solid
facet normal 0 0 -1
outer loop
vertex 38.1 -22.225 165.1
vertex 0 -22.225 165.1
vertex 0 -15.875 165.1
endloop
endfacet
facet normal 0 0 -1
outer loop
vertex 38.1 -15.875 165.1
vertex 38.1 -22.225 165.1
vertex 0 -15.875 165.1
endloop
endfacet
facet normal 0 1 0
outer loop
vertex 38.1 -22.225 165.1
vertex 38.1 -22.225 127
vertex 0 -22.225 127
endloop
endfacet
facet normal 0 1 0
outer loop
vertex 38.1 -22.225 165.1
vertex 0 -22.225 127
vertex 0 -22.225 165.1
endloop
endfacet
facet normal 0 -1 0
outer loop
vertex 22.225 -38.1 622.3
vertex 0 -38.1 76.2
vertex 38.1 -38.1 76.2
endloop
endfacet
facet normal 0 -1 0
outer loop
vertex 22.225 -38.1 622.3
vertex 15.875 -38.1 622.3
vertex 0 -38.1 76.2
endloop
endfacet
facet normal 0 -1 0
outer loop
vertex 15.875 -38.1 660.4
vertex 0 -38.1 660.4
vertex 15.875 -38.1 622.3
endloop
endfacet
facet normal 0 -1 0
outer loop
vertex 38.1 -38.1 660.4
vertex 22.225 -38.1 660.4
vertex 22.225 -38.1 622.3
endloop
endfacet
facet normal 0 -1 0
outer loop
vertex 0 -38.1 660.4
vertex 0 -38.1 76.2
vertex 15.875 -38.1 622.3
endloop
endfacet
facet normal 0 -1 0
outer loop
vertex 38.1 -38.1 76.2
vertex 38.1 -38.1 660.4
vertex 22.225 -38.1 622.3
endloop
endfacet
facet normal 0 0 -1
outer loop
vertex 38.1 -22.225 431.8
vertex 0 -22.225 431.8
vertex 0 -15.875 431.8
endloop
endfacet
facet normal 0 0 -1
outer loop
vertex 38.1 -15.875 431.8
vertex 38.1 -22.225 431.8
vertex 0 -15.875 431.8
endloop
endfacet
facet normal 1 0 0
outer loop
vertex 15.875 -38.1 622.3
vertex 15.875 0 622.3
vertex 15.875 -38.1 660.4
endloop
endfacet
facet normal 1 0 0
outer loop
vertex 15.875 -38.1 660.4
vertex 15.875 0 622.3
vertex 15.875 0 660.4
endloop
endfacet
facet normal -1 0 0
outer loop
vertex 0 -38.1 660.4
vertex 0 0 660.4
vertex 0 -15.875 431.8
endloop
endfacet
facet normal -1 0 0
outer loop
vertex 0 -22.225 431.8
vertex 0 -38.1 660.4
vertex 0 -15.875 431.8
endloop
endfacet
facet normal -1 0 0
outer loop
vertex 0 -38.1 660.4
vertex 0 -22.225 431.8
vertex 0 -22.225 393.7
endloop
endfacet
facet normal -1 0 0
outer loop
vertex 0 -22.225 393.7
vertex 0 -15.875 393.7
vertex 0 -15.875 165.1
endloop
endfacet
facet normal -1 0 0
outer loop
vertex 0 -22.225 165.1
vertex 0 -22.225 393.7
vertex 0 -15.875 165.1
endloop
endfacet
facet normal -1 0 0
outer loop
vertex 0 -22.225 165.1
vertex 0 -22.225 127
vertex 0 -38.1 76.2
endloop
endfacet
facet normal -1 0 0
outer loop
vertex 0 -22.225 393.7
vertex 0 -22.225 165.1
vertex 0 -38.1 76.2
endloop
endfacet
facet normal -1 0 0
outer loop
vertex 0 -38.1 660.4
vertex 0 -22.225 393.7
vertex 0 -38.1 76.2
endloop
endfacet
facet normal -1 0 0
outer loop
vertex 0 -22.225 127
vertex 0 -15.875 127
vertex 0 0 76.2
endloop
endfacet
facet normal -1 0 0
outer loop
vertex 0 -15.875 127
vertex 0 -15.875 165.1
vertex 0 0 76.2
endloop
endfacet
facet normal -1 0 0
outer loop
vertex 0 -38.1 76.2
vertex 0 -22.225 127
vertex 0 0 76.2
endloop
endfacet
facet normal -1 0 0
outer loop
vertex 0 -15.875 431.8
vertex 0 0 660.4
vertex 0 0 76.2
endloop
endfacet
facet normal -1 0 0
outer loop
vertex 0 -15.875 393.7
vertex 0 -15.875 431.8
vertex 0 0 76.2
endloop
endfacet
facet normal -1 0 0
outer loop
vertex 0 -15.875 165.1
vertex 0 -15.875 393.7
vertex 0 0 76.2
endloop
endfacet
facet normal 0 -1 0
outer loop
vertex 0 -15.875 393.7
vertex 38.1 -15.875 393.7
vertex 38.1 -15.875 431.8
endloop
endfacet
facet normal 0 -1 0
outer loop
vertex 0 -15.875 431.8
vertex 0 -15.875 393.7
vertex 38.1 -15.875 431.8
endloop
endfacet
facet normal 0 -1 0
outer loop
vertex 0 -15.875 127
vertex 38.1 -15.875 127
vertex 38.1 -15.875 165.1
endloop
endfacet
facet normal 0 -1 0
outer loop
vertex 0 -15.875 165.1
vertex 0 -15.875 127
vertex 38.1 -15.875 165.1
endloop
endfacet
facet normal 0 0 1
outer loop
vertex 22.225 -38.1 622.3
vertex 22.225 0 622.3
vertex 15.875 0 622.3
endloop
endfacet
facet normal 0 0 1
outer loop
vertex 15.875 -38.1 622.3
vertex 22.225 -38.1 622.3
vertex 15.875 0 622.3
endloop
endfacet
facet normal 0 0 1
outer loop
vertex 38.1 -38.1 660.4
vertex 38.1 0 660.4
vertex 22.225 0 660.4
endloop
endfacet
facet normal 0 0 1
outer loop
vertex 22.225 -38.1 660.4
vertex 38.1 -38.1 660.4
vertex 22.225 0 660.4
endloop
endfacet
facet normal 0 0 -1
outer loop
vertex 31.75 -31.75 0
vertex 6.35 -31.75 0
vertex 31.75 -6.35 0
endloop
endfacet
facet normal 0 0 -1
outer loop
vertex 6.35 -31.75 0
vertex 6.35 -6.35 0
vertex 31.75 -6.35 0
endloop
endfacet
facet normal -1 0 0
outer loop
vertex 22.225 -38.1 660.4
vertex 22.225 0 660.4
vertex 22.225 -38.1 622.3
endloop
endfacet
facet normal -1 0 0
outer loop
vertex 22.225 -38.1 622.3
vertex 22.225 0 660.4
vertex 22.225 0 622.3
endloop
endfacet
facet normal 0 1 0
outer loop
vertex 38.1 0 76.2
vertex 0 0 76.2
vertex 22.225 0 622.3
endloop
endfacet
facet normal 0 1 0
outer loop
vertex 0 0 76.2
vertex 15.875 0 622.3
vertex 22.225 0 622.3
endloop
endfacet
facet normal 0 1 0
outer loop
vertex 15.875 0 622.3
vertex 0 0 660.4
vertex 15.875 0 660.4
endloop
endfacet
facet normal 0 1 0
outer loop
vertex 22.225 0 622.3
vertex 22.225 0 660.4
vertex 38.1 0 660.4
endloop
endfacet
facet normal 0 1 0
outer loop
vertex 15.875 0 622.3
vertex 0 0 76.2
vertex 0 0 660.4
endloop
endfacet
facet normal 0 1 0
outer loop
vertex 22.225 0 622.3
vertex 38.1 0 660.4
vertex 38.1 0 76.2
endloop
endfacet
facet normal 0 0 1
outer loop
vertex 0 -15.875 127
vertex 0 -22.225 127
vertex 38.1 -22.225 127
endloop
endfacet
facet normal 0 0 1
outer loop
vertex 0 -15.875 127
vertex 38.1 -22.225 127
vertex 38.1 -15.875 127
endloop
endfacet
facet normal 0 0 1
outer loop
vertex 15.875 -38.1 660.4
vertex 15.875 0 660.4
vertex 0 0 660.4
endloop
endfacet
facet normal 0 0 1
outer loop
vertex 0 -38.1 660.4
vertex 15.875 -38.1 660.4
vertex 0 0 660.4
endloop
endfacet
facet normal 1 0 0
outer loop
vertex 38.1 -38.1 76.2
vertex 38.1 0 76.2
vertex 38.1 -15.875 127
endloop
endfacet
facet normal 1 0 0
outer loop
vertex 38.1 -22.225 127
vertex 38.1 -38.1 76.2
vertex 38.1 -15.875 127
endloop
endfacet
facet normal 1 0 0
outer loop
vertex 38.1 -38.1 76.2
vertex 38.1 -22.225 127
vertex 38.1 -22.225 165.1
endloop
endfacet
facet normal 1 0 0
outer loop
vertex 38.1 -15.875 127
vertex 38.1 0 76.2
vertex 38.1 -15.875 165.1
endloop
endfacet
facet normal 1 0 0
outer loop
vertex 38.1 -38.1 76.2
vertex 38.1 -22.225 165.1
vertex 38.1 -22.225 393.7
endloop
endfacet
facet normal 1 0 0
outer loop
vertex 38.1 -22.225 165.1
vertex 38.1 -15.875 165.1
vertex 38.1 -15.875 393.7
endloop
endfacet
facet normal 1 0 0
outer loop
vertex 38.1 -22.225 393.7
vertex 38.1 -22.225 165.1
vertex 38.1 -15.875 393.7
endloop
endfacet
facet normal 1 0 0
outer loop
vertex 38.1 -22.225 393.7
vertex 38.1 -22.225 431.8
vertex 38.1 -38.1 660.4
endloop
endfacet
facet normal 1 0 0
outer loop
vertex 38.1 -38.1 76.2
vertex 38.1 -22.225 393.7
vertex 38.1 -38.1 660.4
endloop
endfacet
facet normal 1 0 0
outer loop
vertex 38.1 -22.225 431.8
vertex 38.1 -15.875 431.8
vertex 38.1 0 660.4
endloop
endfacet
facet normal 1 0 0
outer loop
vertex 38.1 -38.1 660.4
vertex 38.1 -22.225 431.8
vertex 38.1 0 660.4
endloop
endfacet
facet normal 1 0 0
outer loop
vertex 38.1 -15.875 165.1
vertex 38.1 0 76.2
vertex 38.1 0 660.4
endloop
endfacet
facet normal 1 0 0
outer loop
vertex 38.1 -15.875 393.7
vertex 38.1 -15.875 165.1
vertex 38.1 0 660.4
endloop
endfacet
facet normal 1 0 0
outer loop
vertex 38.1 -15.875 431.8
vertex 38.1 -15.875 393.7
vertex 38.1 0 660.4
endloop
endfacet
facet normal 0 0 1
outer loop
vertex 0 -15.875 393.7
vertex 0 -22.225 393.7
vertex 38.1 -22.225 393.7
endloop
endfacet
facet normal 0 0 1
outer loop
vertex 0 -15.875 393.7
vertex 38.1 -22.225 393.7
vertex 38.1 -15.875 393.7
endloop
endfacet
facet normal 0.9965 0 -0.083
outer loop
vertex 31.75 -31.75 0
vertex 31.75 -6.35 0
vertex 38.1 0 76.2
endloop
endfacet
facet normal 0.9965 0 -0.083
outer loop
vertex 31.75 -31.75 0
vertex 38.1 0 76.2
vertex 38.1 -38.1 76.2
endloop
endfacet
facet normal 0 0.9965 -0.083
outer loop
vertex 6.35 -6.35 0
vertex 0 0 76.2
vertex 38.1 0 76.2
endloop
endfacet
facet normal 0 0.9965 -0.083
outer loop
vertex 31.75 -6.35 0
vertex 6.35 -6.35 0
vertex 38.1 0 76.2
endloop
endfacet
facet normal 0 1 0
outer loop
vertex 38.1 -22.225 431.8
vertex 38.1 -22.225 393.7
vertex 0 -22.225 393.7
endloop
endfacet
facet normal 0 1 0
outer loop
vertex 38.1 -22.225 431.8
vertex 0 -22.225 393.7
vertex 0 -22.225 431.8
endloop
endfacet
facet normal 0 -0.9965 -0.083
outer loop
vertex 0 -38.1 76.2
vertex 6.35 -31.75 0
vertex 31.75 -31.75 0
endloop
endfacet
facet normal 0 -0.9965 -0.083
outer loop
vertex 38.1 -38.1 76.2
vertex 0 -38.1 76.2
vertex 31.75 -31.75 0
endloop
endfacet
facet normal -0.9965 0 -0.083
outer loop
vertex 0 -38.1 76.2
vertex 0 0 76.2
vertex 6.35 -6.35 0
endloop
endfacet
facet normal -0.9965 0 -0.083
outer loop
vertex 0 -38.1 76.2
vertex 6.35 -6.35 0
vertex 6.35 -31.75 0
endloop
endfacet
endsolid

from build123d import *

# Parameters (mm, degrees)
F1_DEPTH = 38.1
F2_SIZE2 = 76.2
F2_SIZE  = 6.35
F3_W     = 6.35
F3_H     = 38.1
F4_DEPTH = 38.101


with BuildPart() as f1:
    # F0 (on Front) → F1 (new body)
    with BuildSketch(Plane.XZ):
        Polygon((0, 660.4), (0, 0), (38.1, 0), (38.1, 660.4), (22.225, 660.4), (22.225, 622.3), (15.875, 622.3), (15.875, 660.4), align=None)
    extrude(amount=F1_DEPTH)

    # F2
    f2_edges = [f1.edges().sort_by_distance(p)[0] for p in [
        (19.05, -38.1, 0),
        (38.1, -19.05, 0),
        (19.05, 0, 0),
        (0, -19.05, 0),
    ]]
    f2_side = f1.faces().sort_by_distance((19.05, -19.05, 0))[0]
    chamfer(f2_edges, length=F2_SIZE, length2=F2_SIZE2, reference=f2_side)

    # F3 (on face) → F4 (cut, through all)
    with BuildSketch(Plane.YZ.offset(38.1)):
        with Locations((-19.05, 412.75)):
            Rectangle(F3_W, F3_H)
        with Locations((-19.05, 146.05)):
            Rectangle(F3_W, F3_H)
    extrude(amount=-F4_DEPTH, mode=Mode.SUBTRACT)


solid = f1.part
